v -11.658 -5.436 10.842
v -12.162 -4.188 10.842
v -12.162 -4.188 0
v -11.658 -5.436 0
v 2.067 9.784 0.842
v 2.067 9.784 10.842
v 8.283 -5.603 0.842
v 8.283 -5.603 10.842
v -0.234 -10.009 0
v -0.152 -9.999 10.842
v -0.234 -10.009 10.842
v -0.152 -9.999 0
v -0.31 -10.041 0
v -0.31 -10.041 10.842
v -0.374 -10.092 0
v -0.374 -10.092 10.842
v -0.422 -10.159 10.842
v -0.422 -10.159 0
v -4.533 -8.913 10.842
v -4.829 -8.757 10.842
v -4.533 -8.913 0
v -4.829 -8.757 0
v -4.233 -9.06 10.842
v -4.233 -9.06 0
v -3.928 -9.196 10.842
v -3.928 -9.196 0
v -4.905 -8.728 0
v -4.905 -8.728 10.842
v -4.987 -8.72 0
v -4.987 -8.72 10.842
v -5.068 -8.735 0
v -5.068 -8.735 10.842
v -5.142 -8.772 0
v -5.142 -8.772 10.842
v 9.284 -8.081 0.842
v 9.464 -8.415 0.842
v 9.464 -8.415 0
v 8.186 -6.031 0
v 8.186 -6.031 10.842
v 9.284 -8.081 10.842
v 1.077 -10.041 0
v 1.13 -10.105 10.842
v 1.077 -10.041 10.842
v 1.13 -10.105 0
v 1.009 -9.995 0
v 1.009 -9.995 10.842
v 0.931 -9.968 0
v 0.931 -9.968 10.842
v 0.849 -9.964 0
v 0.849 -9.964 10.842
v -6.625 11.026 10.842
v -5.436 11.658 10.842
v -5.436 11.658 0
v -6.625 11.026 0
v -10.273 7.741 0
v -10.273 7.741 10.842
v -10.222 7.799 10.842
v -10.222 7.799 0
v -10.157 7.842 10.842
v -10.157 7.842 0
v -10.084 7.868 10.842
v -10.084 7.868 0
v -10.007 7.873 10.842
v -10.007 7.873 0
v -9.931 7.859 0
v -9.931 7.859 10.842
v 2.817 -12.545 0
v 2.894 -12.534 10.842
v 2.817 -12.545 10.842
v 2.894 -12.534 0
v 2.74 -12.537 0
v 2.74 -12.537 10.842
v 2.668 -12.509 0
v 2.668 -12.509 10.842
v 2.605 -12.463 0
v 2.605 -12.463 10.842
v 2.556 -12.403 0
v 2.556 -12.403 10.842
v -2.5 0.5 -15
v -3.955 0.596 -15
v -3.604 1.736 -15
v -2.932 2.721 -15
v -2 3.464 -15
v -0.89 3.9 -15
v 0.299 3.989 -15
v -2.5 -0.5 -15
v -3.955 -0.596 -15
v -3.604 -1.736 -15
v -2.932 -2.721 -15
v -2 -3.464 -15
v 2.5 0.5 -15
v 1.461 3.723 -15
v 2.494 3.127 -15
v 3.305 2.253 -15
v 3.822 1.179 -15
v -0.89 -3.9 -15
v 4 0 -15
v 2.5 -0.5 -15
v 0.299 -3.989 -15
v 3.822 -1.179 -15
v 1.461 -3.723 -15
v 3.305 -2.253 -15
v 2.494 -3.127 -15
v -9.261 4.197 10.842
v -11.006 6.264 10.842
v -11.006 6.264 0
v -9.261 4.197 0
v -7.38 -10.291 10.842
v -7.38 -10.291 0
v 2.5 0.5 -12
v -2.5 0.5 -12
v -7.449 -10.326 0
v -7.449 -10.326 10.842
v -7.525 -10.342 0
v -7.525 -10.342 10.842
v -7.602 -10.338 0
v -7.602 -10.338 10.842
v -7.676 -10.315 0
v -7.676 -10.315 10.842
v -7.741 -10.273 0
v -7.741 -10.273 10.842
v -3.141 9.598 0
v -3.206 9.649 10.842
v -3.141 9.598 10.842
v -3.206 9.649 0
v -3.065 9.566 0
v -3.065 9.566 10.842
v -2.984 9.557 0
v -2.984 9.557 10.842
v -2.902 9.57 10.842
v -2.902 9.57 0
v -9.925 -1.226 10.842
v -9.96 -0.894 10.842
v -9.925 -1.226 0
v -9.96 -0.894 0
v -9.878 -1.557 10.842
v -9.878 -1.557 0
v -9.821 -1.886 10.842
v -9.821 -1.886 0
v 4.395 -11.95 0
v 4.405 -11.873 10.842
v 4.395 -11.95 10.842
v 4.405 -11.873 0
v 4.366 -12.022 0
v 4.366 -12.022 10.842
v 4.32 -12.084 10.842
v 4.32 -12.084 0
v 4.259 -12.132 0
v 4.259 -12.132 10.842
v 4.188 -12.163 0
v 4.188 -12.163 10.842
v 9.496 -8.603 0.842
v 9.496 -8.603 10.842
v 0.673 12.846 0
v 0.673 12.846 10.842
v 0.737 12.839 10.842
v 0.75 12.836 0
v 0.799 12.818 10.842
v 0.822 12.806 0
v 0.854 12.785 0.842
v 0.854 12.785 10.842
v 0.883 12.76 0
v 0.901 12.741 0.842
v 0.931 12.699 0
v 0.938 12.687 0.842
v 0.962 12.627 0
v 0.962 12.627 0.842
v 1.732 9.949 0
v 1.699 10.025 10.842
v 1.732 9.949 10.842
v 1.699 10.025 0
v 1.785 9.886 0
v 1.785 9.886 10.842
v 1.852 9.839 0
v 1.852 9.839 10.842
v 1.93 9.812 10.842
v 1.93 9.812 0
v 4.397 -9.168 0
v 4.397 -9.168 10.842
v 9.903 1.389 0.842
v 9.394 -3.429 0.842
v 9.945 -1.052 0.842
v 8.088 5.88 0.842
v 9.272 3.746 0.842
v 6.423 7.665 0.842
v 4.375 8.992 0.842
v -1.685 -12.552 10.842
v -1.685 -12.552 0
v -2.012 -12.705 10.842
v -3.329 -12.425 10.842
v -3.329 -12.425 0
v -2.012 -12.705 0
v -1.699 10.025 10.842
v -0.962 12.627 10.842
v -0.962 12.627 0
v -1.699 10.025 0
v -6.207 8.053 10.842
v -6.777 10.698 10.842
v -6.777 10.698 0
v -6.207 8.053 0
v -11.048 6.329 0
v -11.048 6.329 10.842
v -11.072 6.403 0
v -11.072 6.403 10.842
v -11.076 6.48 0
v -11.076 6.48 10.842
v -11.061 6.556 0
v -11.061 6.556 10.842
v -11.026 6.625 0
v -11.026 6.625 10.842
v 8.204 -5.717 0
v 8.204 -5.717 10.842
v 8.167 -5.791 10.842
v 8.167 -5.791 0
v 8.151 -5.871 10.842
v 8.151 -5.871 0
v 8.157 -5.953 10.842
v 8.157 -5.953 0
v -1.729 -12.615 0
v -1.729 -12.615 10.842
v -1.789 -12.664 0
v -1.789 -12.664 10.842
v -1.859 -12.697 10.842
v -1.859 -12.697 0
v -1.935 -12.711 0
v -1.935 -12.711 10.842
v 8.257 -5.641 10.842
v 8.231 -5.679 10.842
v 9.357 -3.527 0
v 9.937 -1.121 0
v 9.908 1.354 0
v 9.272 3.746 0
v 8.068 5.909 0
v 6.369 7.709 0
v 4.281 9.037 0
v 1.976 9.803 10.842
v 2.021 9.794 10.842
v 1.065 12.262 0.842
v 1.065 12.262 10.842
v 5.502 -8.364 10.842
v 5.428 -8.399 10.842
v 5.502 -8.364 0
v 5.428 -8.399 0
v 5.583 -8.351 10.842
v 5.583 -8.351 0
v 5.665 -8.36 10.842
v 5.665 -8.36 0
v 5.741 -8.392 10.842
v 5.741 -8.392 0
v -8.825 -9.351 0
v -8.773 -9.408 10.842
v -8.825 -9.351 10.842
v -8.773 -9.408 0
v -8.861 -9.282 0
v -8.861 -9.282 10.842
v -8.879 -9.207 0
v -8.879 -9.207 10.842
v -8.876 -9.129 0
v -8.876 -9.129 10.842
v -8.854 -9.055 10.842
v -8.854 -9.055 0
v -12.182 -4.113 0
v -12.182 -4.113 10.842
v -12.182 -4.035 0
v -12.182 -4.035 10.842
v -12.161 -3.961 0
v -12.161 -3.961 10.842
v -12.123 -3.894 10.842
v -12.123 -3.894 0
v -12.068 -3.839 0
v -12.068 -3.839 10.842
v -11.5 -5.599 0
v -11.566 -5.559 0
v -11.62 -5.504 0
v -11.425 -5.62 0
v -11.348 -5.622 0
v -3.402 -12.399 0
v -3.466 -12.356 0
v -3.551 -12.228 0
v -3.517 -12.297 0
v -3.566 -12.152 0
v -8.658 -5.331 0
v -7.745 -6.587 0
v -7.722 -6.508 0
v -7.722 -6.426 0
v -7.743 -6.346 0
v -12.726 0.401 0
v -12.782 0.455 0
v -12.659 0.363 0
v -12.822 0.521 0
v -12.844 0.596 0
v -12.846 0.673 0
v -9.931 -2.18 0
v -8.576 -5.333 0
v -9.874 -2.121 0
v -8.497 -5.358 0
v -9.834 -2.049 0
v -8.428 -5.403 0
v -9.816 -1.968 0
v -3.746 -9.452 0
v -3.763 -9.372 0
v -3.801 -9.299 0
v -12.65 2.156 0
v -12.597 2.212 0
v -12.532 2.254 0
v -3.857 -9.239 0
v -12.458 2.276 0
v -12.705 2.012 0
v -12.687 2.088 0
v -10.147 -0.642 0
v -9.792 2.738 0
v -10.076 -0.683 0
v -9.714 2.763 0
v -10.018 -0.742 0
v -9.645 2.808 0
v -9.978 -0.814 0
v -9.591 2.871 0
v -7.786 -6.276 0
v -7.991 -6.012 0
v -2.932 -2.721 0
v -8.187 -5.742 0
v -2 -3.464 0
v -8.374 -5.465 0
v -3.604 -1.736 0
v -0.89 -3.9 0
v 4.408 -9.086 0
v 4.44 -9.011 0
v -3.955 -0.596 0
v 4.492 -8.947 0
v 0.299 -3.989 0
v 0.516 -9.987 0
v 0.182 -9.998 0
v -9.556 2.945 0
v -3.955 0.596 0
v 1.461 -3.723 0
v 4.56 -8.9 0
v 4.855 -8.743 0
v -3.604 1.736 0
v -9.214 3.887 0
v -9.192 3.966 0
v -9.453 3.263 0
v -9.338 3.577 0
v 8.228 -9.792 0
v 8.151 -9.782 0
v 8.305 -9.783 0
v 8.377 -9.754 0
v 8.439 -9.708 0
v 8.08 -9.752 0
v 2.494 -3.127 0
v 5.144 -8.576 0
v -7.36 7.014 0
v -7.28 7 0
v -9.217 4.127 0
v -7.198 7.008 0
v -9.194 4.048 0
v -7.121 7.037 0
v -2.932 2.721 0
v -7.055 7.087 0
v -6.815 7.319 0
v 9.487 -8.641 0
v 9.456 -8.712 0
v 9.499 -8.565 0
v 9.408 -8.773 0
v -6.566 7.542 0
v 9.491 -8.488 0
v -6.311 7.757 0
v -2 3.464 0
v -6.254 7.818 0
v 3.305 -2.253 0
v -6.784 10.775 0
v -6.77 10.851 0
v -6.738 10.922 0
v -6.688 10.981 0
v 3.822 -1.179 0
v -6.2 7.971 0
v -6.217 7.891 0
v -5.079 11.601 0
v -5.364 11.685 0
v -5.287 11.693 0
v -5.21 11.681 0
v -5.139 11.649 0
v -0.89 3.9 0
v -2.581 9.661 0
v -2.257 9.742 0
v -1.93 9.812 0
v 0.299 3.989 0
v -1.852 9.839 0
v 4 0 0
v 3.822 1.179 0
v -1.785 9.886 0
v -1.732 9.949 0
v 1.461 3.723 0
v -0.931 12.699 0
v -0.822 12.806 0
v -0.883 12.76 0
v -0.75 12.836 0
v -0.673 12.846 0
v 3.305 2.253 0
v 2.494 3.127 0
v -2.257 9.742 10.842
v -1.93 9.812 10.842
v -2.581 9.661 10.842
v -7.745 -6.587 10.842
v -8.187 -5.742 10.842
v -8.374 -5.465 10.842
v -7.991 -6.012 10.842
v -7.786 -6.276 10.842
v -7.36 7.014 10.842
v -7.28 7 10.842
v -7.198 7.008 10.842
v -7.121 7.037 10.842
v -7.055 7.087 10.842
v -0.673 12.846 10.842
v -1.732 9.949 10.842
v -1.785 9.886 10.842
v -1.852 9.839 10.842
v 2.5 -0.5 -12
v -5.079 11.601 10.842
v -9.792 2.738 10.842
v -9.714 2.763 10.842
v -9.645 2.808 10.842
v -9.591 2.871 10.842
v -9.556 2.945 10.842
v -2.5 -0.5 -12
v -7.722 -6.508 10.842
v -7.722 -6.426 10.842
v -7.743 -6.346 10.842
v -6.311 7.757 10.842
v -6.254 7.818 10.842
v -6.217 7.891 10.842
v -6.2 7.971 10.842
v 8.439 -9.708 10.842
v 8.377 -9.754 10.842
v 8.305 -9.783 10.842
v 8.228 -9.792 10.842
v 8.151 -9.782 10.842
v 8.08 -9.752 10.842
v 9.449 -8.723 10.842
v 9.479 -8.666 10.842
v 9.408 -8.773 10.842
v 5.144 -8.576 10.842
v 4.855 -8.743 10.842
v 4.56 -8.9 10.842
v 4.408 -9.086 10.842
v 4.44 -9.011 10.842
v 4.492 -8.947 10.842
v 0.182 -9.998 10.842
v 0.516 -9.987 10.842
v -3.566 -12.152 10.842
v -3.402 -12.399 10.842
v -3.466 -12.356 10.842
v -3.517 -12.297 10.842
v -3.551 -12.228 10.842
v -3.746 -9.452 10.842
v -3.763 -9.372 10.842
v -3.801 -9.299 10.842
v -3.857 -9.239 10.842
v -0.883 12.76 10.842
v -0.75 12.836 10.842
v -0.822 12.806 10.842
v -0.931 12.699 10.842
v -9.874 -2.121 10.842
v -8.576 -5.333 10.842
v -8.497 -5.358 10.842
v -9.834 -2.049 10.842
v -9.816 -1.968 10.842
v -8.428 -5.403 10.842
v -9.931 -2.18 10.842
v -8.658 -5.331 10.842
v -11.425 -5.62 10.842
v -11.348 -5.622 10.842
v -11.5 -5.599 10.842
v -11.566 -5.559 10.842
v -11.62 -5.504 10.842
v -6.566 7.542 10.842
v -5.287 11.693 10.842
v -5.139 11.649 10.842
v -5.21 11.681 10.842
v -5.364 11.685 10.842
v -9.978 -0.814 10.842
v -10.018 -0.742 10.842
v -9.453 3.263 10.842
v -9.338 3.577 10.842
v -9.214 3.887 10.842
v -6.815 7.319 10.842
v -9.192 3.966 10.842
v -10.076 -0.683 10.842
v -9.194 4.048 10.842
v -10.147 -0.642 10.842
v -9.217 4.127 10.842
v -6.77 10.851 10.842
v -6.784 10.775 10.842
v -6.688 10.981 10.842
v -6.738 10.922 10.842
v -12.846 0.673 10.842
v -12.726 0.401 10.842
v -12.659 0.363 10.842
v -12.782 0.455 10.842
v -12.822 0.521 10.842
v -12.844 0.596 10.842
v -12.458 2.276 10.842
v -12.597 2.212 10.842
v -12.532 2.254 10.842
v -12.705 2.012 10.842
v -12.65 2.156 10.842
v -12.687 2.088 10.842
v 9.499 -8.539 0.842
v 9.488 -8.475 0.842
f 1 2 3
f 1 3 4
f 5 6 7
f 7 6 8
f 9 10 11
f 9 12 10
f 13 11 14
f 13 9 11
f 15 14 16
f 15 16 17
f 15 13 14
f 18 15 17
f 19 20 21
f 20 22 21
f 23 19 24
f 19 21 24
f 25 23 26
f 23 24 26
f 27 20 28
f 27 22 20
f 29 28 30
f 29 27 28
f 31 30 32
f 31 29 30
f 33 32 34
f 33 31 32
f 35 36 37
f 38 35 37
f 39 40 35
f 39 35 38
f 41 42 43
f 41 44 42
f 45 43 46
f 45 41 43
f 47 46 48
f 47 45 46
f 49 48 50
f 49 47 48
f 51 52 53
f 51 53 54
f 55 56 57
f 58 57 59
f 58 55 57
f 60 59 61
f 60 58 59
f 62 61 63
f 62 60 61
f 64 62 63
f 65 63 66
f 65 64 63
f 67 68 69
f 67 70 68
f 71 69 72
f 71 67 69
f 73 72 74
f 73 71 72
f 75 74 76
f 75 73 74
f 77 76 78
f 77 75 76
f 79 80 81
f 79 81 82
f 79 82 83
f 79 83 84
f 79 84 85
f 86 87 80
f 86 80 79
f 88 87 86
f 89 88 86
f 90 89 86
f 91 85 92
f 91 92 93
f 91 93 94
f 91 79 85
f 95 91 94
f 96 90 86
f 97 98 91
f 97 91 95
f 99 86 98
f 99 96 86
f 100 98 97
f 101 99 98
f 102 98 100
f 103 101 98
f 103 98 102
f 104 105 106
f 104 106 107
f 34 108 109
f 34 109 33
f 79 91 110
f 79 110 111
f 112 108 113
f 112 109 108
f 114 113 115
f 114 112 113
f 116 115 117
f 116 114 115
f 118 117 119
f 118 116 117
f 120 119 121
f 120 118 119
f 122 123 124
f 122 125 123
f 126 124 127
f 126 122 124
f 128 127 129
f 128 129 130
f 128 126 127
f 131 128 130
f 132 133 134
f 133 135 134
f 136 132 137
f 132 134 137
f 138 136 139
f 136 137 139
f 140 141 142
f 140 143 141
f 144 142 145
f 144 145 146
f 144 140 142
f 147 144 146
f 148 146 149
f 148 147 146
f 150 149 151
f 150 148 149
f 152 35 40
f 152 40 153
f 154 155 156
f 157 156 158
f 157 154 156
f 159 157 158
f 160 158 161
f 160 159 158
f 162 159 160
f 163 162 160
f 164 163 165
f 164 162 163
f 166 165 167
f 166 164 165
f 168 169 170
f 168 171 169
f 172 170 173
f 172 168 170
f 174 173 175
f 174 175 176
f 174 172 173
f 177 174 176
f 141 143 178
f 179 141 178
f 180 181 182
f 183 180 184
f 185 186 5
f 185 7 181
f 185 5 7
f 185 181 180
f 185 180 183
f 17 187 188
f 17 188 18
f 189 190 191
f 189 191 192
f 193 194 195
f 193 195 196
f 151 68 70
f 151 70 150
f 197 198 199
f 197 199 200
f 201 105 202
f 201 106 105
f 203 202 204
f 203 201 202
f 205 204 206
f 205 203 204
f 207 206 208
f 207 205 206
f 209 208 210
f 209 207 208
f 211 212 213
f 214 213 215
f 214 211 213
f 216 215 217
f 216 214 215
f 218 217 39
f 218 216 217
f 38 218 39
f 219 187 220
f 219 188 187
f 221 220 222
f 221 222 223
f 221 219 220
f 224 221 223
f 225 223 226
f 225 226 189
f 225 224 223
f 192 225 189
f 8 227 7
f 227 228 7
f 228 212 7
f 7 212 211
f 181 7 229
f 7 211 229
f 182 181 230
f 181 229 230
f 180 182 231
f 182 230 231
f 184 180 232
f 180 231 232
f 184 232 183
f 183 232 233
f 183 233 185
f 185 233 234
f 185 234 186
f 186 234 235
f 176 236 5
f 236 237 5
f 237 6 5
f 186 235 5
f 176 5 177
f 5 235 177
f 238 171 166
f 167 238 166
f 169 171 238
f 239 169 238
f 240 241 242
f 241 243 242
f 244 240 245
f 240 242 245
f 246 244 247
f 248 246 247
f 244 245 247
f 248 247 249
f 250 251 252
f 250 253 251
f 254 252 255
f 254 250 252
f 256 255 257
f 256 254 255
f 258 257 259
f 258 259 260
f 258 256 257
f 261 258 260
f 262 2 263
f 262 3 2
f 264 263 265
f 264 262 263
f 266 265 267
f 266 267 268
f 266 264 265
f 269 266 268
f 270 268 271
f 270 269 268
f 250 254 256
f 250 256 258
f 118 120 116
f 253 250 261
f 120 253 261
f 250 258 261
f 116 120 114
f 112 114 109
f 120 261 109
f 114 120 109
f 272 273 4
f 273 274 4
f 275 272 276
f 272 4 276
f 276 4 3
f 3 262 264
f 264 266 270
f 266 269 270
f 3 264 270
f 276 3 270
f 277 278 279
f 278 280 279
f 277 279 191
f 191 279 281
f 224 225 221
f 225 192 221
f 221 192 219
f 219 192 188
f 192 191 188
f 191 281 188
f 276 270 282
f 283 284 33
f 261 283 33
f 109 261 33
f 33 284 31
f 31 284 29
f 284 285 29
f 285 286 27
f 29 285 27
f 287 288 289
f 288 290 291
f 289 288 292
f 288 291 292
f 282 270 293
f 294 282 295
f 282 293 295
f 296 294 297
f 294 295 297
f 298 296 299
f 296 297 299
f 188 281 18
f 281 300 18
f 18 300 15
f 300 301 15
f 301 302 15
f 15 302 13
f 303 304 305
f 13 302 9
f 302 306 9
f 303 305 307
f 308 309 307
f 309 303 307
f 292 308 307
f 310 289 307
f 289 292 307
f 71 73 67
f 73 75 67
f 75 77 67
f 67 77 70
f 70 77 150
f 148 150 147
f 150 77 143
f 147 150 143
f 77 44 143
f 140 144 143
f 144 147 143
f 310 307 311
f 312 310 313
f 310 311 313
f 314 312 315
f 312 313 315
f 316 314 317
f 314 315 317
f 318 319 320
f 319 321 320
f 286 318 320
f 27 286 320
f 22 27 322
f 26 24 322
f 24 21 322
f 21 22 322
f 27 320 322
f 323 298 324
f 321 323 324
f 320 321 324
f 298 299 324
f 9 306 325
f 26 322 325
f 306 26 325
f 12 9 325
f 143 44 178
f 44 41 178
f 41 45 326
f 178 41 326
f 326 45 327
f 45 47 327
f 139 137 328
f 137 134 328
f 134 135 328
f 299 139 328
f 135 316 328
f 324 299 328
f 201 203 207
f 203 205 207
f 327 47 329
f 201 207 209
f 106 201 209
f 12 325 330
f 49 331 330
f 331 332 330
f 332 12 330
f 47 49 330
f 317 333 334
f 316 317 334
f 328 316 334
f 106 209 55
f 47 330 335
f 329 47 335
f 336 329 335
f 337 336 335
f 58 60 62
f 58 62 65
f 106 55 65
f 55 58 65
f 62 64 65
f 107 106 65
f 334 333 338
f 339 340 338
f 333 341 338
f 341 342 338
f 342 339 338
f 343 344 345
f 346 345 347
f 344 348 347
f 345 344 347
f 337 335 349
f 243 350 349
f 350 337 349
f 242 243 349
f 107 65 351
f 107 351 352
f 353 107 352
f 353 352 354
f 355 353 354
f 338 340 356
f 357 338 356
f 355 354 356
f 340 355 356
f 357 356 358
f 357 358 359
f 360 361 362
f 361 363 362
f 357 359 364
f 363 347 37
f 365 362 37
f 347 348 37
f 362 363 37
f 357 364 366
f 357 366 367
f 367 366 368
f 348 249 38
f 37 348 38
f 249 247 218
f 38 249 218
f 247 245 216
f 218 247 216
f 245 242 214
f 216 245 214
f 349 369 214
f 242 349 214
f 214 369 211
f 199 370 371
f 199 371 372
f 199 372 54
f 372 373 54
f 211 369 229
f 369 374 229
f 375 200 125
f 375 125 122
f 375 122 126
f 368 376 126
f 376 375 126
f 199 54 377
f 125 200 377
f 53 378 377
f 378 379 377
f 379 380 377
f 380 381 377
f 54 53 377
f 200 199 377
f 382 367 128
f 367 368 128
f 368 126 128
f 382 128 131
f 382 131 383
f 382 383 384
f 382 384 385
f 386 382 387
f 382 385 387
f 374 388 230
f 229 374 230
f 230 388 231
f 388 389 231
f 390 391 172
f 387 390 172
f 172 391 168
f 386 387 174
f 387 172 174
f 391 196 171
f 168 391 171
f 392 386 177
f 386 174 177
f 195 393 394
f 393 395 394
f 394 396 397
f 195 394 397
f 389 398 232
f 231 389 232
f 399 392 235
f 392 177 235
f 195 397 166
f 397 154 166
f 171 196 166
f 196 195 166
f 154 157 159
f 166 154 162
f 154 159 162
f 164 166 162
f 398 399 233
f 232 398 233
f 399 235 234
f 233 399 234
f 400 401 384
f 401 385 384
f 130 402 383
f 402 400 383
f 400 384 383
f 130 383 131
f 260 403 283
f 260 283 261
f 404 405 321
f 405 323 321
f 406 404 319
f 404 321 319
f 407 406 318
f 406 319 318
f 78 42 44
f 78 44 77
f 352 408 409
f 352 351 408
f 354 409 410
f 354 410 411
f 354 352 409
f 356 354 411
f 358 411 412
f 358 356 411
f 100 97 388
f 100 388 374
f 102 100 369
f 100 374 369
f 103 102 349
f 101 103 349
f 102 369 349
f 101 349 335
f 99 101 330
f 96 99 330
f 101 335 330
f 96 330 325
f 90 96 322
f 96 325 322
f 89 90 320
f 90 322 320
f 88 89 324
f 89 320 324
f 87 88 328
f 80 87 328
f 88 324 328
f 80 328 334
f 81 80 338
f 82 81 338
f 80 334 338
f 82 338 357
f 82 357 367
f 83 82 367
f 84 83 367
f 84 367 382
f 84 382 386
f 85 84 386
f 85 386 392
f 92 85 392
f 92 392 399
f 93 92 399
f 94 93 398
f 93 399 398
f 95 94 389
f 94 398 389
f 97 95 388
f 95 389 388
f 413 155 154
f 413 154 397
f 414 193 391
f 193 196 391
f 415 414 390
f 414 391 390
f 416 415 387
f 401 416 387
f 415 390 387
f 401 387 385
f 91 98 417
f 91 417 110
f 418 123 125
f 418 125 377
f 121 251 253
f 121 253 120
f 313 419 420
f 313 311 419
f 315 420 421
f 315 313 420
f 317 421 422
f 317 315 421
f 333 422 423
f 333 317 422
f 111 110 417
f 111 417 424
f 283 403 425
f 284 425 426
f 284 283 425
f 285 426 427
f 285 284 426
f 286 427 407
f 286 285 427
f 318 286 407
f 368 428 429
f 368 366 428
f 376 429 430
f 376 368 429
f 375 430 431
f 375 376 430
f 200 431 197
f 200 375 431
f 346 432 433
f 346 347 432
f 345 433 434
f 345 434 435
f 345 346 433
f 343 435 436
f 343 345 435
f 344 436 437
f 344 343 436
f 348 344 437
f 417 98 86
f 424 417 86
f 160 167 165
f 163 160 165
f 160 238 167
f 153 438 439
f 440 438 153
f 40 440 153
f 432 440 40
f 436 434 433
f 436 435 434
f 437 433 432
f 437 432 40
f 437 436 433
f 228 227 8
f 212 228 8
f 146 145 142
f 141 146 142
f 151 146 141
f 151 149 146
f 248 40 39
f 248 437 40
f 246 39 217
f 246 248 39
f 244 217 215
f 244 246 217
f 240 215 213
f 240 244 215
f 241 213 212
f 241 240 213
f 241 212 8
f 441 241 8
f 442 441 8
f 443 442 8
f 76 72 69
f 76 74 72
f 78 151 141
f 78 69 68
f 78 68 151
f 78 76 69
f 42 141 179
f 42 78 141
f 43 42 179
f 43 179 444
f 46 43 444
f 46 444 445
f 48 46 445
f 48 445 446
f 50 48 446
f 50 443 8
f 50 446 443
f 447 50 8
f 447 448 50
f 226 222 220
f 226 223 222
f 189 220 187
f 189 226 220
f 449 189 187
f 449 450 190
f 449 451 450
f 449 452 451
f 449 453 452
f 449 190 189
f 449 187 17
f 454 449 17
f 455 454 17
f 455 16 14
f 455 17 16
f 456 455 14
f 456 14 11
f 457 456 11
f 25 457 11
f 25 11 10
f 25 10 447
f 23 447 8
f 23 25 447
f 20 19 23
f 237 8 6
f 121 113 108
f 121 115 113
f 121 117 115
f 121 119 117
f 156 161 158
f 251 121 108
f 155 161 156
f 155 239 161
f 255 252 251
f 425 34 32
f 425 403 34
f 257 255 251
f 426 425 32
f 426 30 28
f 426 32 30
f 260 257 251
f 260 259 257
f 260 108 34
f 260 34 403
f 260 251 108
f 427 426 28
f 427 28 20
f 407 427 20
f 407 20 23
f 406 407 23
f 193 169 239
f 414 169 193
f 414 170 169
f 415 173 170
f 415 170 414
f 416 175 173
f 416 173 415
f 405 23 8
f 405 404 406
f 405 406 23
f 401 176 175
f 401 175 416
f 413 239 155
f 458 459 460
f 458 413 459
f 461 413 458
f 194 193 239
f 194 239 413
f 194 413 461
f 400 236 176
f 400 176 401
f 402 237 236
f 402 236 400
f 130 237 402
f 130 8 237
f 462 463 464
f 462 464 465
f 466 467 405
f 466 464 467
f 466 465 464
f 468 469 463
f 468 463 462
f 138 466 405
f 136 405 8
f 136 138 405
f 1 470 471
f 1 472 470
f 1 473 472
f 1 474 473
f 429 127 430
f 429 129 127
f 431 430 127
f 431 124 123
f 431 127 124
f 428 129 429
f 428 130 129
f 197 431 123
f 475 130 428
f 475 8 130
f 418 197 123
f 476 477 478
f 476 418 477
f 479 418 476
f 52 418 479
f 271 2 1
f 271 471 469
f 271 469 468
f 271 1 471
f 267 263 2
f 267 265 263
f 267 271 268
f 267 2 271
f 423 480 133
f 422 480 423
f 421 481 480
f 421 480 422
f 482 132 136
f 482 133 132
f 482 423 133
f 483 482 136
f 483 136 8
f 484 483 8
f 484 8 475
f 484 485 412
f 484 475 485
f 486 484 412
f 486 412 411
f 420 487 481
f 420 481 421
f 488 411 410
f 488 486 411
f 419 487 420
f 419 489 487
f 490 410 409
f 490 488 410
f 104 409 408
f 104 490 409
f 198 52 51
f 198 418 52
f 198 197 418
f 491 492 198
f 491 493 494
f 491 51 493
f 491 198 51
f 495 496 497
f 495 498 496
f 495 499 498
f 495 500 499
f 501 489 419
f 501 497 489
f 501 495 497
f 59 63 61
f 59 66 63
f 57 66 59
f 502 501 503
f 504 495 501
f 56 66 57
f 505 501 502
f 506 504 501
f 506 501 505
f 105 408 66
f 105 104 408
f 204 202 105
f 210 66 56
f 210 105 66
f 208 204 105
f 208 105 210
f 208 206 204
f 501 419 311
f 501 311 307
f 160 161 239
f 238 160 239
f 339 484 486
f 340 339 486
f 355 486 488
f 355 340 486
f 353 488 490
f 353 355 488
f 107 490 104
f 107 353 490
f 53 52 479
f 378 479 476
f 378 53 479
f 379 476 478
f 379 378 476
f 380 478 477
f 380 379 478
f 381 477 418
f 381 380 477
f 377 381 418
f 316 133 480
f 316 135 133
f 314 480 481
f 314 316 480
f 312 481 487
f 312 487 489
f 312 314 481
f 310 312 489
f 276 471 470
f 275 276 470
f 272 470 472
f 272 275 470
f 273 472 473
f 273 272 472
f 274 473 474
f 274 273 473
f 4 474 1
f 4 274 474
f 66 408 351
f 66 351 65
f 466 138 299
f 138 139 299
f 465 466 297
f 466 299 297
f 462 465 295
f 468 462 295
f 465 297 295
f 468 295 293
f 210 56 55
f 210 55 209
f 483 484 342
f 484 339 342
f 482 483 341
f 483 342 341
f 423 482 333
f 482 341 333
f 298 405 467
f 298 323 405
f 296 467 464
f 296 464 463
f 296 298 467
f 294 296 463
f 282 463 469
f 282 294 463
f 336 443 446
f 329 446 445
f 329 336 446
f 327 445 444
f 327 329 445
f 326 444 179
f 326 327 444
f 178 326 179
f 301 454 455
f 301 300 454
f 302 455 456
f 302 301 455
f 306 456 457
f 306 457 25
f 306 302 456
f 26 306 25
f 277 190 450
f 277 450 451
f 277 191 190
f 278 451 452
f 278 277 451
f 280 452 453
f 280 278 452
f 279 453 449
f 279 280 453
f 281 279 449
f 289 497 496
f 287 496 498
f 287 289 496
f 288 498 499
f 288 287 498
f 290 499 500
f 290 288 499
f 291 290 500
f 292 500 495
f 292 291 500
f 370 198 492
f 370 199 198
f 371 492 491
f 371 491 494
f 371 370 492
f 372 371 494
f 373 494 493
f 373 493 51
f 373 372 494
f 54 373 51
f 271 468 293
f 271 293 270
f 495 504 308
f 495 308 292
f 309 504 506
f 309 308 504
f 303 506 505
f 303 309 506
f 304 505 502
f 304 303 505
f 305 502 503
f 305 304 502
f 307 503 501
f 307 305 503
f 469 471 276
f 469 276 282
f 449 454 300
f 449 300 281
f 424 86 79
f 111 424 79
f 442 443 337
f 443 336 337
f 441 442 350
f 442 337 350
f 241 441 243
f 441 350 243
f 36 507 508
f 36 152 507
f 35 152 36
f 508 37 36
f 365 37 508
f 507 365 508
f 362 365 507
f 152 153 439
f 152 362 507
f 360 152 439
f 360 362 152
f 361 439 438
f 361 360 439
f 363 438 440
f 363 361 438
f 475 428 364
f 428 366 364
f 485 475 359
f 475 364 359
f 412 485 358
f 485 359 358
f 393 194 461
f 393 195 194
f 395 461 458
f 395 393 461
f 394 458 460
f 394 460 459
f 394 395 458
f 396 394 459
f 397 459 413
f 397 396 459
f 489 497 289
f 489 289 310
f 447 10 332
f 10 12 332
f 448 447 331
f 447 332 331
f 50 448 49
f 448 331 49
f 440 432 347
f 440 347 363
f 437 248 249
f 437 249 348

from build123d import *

# Parameters (mm, degrees)
ESQUISSE1_R                        = 10
MAIN_EXTRUSION_DEPTH               = 10.841776527
GEAR_ELEMENT_DEPTH                 = 10.841776527
CONG_1_R                           = 0.3
R_P_TITION_CIRCULAIRE1_COUNT       = 9
R_P_TITION_CIRCULAIRE1_ANGLE       = 224
CONG_1_OF_R_P_TITION_CIRCULAIRE1_R = 0.3
ESQUISSE3_R                        = 4
MAIN_AXE_DEPTH                     = 15
ESQUISSE4_W                        = 5
ESQUISSE4_H                        = 1
AXE_TRAIT_DEPTH                    = 3
ENL_V_MAT_EXTRU_1_DEPTH            = 10


with BuildPart() as part:
    # Esquisse1 → Main Extrusion (new body)
    with BuildSketch(Plane.XY):
        Circle(ESQUISSE1_R)
    extrude(amount=MAIN_EXTRUSION_DEPTH)

    # Esquisse2 → Gear Element (add)
    with BuildSketch(Plane.XY.offset(10.841776527)):
        Polygon((-1.75, 9.845684334), (1.75, 9.845684334), (0.9, 12.845684334), (-0.9, 12.845684334), align=None)
    gear_element = extrude(amount=-GEAR_ELEMENT_DEPTH)

    # Congé1
    cong_1_edges = [part.edges().sort_by_distance(p)[0] for p in [
        (-1.75, 9.845684334, 5.420888263),
        (-0.9, 12.845684334, 5.420888263),
        (0.9, 12.845684334, 5.420888263),
        (1.75, 9.845684334, 5.420888263),
    ]]
    fillet(cong_1_edges, radius=CONG_1_R)

    # Répétition circulaire1: Gear Element ×9 about axis
    r_p_tition_circulaire1_axis = Axis((0, 0, 0), (0, 0, 1))
    for i in range(1, R_P_TITION_CIRCULAIRE1_COUNT):
        add(gear_element.rotate(r_p_tition_circulaire1_axis, i * R_P_TITION_CIRCULAIRE1_ANGLE / (R_P_TITION_CIRCULAIRE1_COUNT - 1)))

    # Congé1 of Répétition circulaire1
    cong_1_of_r_p_tition_circulaire1_edges = [part.edges().sort_by_distance(p)[0] for p in [
        (-6.167427098, 7.871648048, 5.420888263),
        (-6.825336333, 10.919541655, 5.420888263),
        (-5.236030666, 11.764590468, 5.420888263),
        (-3.077110523, 9.514798517, 5.420888263),
        (-9.141029821, 4.054821057, 5.420888263),
        (-11.152828571, 6.437081704, 5.420888263),
        (-10.146281345, 7.929349335, 5.420888263),
        (-7.183854659, 6.956452561, 5.420888263),
        (-9.974673456, -0.711259064, 5.420888263),
        (-12.869389948, 0.447669937, 5.420888263),
        (-12.681238714, 2.237809349, 5.420888263),
        (-9.608823834, 2.76956757, 5.420888263),
        (-8.473198013, -5.310830014, 5.420888263),
        (-11.573165181, -5.646543517, 5.420888263),
        (-12.247457049, -3.977612579, 5.420888263),
        (-9.78432109, -2.065686523, 5.420888263),
        (-4.988106123, -8.66711009, 5.420888263),
        (-7.567606729, -10.418873951, 5.420888263),
        (-8.946486726, -9.261856253, 5.420888263),
        (-7.669261674, -6.417353456, 5.420888263),
        (-0.335274576, -9.994377968, 5.420888263),
        (-1.790435109, -12.752095833, 5.420888263),
        (-3.55110079, -12.377854789, 5.420888263),
        (-3.758791178, -9.26668705, 5.420888263),
        (4.396046364, -8.981913848, 5.420888263),
        (4.40588599, -12.099990688, 5.420888263),
        (2.675614937, -12.596137928, 5.420888263),
        (1.031630428, -9.946644593, 5.420888263),
        (8.098231686, -5.866740455, 5.420888263),
        (9.570767967, -8.61521947, 5.420888263),
        (8.275956326, -9.865604537, 5.420888263),
        (5.580542385, -8.298044751, 5.420888263),
    ]]
    fillet(cong_1_of_r_p_tition_circulaire1_edges, radius=CONG_1_OF_R_P_TITION_CIRCULAIRE1_R)

    # Esquisse3 → Main Axe (add)
    with BuildSketch(Plane(origin=(0, 0, 0), x_dir=(-1, 0, 0), z_dir=(0, 0, -1))):
        with Locations(Location((0, 0, 0), (0, 0, 180))):
            Circle(ESQUISSE3_R)
    extrude(amount=MAIN_AXE_DEPTH)

    # Esquisse4 → Axe Trait (cut)
    with BuildSketch(Plane(origin=(0, 0, -15), x_dir=(-1, 0, 0), z_dir=(0, 0, -1))):
        Rectangle(ESQUISSE4_W, ESQUISSE4_H)
    extrude(amount=-AXE_TRAIT_DEPTH, mode=Mode.SUBTRACT)

    # Esquisse5 → Enlèv. mat.-Extru.1 (cut)
    with BuildSketch(Plane.XY.offset(10.841776527)):
        Polygon((0.854113079, 12.78498982), (9.495597726, -8.603435225), (13.592580869, -6.948146588), (4.951096222, 14.440278457), align=None)
    extrude(amount=-ENL_V_MAT_EXTRU_1_DEPTH, mode=Mode.SUBTRACT)


solid = part.part
